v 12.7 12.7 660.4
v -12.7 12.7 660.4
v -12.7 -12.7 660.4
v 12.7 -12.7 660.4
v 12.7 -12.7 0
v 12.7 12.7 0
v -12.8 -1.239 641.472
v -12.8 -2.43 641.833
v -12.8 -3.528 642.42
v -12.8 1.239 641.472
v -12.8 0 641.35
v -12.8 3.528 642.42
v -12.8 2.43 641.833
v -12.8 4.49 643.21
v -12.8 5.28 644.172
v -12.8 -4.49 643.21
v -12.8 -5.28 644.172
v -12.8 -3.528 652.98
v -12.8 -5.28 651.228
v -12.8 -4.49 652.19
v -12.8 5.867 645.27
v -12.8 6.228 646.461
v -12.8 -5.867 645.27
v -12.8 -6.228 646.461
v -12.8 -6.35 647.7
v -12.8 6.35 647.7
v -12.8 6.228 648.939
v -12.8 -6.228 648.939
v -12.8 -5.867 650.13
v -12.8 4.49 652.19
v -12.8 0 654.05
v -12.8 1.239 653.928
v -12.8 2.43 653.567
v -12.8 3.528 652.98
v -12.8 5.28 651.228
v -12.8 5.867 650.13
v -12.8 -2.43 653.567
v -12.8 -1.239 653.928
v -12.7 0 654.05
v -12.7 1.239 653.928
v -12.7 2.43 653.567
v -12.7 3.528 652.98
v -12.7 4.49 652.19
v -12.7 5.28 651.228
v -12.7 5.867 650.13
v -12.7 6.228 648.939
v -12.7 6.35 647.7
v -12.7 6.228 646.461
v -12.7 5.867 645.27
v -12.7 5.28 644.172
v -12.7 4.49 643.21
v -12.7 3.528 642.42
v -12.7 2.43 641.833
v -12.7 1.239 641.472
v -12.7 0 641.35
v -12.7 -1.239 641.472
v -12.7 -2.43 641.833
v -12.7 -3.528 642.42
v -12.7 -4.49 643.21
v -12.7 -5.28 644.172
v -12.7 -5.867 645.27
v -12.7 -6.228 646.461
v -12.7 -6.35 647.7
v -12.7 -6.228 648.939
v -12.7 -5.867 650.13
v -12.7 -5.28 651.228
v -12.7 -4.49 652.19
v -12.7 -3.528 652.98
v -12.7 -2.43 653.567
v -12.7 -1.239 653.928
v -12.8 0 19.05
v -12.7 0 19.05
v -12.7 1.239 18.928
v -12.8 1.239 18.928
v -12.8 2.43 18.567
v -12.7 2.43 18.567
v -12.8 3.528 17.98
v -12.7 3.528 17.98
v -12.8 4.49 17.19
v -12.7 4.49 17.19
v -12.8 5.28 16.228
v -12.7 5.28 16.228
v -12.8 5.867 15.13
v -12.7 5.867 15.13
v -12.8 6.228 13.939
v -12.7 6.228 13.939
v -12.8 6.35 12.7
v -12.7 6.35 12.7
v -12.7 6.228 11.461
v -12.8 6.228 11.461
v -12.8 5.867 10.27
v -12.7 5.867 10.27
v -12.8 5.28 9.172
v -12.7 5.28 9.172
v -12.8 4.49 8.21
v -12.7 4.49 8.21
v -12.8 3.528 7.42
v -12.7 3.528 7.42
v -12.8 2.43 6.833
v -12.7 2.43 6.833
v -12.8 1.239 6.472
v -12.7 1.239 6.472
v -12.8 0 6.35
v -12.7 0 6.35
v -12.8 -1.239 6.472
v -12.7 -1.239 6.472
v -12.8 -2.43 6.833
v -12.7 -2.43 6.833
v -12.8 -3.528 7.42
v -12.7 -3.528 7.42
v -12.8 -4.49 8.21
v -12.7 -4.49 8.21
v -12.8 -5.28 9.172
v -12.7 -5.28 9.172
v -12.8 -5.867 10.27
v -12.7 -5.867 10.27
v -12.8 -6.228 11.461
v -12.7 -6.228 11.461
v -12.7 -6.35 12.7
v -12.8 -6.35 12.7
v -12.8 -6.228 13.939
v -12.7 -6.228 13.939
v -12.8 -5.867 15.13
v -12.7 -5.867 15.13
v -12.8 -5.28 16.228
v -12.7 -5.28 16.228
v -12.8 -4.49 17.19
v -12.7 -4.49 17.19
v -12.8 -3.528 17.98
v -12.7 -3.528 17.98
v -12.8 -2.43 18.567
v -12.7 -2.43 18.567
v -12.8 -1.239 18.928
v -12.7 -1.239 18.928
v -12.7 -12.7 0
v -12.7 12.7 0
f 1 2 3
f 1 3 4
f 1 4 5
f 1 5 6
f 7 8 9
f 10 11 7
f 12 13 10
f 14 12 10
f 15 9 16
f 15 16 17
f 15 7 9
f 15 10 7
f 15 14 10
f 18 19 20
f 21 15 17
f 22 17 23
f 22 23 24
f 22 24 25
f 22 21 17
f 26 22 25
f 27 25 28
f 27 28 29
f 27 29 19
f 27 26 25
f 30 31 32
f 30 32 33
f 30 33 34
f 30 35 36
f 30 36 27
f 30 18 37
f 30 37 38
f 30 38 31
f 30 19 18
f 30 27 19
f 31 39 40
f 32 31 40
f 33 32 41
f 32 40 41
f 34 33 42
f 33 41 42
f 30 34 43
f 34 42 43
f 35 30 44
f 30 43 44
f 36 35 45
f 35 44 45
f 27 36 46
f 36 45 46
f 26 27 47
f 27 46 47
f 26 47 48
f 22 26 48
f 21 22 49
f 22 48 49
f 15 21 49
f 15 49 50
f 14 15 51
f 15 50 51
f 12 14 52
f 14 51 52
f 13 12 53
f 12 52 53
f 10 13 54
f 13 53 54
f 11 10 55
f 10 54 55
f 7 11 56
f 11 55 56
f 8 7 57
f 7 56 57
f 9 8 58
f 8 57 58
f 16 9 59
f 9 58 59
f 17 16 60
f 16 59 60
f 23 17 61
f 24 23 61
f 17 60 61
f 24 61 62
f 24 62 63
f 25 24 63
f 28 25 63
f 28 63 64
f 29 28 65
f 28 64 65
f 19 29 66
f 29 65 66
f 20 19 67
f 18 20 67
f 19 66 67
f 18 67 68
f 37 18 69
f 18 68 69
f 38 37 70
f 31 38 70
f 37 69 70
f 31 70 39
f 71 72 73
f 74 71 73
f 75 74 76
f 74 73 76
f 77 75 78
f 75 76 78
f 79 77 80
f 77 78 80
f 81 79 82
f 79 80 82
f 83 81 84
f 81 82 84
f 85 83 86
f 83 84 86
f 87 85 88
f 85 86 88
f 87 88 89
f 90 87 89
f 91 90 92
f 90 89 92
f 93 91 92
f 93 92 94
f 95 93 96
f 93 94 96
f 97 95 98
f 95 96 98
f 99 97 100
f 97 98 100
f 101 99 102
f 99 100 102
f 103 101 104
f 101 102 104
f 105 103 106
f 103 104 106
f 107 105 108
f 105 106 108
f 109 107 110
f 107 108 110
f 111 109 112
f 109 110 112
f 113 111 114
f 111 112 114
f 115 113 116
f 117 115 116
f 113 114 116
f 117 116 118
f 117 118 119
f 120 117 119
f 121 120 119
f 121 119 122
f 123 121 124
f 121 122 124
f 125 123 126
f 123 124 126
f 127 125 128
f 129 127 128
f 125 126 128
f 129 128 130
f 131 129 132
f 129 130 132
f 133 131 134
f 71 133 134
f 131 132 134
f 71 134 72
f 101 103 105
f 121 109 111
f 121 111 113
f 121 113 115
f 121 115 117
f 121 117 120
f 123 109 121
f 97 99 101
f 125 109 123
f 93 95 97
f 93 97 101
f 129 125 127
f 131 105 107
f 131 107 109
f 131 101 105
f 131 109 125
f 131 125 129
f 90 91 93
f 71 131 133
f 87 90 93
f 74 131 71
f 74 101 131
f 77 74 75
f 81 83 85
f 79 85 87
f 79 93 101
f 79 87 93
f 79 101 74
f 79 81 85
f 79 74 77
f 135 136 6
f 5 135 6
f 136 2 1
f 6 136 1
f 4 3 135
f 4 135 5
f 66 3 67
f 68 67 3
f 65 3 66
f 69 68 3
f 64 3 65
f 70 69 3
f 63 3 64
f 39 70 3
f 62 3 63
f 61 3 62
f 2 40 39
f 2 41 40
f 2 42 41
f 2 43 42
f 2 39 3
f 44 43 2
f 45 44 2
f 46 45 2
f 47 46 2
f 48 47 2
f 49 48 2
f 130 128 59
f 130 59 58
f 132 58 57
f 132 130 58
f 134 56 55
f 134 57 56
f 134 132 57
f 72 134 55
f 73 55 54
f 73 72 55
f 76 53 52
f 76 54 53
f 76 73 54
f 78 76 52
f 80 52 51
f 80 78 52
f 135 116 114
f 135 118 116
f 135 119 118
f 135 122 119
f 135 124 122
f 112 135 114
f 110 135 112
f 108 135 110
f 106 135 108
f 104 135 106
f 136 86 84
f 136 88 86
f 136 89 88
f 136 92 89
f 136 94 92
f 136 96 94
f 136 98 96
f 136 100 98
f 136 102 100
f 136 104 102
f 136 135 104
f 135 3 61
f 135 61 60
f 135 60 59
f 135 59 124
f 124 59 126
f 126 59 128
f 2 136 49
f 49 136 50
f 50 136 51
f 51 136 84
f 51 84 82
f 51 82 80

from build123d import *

# Parameters (mm, degrees)
SKETCH1_W           = 25.4
SKETCH1_H           = 25.4
BOSS_EXTRUDE1_DEPTH = 660.4
SKETCH2_R           = 6.35
BOSS_EXTRUDE2_DEPTH = 0.1


with BuildPart() as part:
    # Sketch1 → Boss-Extrude1 (new body)
    with BuildSketch(Plane.XY):
        Rectangle(SKETCH1_W, SKETCH1_H)
    extrude(amount=BOSS_EXTRUDE1_DEPTH)

    # Sketch2 → Boss-Extrude2 (add)
    with BuildSketch(Plane.ZY.offset(12.7)):
        with Locations((647.7, 0)):
            Circle(SKETCH2_R)
        with Locations((12.7, 0)):
            Circle(SKETCH2_R)
    extrude(amount=BOSS_EXTRUDE2_DEPTH)


solid = part.part
